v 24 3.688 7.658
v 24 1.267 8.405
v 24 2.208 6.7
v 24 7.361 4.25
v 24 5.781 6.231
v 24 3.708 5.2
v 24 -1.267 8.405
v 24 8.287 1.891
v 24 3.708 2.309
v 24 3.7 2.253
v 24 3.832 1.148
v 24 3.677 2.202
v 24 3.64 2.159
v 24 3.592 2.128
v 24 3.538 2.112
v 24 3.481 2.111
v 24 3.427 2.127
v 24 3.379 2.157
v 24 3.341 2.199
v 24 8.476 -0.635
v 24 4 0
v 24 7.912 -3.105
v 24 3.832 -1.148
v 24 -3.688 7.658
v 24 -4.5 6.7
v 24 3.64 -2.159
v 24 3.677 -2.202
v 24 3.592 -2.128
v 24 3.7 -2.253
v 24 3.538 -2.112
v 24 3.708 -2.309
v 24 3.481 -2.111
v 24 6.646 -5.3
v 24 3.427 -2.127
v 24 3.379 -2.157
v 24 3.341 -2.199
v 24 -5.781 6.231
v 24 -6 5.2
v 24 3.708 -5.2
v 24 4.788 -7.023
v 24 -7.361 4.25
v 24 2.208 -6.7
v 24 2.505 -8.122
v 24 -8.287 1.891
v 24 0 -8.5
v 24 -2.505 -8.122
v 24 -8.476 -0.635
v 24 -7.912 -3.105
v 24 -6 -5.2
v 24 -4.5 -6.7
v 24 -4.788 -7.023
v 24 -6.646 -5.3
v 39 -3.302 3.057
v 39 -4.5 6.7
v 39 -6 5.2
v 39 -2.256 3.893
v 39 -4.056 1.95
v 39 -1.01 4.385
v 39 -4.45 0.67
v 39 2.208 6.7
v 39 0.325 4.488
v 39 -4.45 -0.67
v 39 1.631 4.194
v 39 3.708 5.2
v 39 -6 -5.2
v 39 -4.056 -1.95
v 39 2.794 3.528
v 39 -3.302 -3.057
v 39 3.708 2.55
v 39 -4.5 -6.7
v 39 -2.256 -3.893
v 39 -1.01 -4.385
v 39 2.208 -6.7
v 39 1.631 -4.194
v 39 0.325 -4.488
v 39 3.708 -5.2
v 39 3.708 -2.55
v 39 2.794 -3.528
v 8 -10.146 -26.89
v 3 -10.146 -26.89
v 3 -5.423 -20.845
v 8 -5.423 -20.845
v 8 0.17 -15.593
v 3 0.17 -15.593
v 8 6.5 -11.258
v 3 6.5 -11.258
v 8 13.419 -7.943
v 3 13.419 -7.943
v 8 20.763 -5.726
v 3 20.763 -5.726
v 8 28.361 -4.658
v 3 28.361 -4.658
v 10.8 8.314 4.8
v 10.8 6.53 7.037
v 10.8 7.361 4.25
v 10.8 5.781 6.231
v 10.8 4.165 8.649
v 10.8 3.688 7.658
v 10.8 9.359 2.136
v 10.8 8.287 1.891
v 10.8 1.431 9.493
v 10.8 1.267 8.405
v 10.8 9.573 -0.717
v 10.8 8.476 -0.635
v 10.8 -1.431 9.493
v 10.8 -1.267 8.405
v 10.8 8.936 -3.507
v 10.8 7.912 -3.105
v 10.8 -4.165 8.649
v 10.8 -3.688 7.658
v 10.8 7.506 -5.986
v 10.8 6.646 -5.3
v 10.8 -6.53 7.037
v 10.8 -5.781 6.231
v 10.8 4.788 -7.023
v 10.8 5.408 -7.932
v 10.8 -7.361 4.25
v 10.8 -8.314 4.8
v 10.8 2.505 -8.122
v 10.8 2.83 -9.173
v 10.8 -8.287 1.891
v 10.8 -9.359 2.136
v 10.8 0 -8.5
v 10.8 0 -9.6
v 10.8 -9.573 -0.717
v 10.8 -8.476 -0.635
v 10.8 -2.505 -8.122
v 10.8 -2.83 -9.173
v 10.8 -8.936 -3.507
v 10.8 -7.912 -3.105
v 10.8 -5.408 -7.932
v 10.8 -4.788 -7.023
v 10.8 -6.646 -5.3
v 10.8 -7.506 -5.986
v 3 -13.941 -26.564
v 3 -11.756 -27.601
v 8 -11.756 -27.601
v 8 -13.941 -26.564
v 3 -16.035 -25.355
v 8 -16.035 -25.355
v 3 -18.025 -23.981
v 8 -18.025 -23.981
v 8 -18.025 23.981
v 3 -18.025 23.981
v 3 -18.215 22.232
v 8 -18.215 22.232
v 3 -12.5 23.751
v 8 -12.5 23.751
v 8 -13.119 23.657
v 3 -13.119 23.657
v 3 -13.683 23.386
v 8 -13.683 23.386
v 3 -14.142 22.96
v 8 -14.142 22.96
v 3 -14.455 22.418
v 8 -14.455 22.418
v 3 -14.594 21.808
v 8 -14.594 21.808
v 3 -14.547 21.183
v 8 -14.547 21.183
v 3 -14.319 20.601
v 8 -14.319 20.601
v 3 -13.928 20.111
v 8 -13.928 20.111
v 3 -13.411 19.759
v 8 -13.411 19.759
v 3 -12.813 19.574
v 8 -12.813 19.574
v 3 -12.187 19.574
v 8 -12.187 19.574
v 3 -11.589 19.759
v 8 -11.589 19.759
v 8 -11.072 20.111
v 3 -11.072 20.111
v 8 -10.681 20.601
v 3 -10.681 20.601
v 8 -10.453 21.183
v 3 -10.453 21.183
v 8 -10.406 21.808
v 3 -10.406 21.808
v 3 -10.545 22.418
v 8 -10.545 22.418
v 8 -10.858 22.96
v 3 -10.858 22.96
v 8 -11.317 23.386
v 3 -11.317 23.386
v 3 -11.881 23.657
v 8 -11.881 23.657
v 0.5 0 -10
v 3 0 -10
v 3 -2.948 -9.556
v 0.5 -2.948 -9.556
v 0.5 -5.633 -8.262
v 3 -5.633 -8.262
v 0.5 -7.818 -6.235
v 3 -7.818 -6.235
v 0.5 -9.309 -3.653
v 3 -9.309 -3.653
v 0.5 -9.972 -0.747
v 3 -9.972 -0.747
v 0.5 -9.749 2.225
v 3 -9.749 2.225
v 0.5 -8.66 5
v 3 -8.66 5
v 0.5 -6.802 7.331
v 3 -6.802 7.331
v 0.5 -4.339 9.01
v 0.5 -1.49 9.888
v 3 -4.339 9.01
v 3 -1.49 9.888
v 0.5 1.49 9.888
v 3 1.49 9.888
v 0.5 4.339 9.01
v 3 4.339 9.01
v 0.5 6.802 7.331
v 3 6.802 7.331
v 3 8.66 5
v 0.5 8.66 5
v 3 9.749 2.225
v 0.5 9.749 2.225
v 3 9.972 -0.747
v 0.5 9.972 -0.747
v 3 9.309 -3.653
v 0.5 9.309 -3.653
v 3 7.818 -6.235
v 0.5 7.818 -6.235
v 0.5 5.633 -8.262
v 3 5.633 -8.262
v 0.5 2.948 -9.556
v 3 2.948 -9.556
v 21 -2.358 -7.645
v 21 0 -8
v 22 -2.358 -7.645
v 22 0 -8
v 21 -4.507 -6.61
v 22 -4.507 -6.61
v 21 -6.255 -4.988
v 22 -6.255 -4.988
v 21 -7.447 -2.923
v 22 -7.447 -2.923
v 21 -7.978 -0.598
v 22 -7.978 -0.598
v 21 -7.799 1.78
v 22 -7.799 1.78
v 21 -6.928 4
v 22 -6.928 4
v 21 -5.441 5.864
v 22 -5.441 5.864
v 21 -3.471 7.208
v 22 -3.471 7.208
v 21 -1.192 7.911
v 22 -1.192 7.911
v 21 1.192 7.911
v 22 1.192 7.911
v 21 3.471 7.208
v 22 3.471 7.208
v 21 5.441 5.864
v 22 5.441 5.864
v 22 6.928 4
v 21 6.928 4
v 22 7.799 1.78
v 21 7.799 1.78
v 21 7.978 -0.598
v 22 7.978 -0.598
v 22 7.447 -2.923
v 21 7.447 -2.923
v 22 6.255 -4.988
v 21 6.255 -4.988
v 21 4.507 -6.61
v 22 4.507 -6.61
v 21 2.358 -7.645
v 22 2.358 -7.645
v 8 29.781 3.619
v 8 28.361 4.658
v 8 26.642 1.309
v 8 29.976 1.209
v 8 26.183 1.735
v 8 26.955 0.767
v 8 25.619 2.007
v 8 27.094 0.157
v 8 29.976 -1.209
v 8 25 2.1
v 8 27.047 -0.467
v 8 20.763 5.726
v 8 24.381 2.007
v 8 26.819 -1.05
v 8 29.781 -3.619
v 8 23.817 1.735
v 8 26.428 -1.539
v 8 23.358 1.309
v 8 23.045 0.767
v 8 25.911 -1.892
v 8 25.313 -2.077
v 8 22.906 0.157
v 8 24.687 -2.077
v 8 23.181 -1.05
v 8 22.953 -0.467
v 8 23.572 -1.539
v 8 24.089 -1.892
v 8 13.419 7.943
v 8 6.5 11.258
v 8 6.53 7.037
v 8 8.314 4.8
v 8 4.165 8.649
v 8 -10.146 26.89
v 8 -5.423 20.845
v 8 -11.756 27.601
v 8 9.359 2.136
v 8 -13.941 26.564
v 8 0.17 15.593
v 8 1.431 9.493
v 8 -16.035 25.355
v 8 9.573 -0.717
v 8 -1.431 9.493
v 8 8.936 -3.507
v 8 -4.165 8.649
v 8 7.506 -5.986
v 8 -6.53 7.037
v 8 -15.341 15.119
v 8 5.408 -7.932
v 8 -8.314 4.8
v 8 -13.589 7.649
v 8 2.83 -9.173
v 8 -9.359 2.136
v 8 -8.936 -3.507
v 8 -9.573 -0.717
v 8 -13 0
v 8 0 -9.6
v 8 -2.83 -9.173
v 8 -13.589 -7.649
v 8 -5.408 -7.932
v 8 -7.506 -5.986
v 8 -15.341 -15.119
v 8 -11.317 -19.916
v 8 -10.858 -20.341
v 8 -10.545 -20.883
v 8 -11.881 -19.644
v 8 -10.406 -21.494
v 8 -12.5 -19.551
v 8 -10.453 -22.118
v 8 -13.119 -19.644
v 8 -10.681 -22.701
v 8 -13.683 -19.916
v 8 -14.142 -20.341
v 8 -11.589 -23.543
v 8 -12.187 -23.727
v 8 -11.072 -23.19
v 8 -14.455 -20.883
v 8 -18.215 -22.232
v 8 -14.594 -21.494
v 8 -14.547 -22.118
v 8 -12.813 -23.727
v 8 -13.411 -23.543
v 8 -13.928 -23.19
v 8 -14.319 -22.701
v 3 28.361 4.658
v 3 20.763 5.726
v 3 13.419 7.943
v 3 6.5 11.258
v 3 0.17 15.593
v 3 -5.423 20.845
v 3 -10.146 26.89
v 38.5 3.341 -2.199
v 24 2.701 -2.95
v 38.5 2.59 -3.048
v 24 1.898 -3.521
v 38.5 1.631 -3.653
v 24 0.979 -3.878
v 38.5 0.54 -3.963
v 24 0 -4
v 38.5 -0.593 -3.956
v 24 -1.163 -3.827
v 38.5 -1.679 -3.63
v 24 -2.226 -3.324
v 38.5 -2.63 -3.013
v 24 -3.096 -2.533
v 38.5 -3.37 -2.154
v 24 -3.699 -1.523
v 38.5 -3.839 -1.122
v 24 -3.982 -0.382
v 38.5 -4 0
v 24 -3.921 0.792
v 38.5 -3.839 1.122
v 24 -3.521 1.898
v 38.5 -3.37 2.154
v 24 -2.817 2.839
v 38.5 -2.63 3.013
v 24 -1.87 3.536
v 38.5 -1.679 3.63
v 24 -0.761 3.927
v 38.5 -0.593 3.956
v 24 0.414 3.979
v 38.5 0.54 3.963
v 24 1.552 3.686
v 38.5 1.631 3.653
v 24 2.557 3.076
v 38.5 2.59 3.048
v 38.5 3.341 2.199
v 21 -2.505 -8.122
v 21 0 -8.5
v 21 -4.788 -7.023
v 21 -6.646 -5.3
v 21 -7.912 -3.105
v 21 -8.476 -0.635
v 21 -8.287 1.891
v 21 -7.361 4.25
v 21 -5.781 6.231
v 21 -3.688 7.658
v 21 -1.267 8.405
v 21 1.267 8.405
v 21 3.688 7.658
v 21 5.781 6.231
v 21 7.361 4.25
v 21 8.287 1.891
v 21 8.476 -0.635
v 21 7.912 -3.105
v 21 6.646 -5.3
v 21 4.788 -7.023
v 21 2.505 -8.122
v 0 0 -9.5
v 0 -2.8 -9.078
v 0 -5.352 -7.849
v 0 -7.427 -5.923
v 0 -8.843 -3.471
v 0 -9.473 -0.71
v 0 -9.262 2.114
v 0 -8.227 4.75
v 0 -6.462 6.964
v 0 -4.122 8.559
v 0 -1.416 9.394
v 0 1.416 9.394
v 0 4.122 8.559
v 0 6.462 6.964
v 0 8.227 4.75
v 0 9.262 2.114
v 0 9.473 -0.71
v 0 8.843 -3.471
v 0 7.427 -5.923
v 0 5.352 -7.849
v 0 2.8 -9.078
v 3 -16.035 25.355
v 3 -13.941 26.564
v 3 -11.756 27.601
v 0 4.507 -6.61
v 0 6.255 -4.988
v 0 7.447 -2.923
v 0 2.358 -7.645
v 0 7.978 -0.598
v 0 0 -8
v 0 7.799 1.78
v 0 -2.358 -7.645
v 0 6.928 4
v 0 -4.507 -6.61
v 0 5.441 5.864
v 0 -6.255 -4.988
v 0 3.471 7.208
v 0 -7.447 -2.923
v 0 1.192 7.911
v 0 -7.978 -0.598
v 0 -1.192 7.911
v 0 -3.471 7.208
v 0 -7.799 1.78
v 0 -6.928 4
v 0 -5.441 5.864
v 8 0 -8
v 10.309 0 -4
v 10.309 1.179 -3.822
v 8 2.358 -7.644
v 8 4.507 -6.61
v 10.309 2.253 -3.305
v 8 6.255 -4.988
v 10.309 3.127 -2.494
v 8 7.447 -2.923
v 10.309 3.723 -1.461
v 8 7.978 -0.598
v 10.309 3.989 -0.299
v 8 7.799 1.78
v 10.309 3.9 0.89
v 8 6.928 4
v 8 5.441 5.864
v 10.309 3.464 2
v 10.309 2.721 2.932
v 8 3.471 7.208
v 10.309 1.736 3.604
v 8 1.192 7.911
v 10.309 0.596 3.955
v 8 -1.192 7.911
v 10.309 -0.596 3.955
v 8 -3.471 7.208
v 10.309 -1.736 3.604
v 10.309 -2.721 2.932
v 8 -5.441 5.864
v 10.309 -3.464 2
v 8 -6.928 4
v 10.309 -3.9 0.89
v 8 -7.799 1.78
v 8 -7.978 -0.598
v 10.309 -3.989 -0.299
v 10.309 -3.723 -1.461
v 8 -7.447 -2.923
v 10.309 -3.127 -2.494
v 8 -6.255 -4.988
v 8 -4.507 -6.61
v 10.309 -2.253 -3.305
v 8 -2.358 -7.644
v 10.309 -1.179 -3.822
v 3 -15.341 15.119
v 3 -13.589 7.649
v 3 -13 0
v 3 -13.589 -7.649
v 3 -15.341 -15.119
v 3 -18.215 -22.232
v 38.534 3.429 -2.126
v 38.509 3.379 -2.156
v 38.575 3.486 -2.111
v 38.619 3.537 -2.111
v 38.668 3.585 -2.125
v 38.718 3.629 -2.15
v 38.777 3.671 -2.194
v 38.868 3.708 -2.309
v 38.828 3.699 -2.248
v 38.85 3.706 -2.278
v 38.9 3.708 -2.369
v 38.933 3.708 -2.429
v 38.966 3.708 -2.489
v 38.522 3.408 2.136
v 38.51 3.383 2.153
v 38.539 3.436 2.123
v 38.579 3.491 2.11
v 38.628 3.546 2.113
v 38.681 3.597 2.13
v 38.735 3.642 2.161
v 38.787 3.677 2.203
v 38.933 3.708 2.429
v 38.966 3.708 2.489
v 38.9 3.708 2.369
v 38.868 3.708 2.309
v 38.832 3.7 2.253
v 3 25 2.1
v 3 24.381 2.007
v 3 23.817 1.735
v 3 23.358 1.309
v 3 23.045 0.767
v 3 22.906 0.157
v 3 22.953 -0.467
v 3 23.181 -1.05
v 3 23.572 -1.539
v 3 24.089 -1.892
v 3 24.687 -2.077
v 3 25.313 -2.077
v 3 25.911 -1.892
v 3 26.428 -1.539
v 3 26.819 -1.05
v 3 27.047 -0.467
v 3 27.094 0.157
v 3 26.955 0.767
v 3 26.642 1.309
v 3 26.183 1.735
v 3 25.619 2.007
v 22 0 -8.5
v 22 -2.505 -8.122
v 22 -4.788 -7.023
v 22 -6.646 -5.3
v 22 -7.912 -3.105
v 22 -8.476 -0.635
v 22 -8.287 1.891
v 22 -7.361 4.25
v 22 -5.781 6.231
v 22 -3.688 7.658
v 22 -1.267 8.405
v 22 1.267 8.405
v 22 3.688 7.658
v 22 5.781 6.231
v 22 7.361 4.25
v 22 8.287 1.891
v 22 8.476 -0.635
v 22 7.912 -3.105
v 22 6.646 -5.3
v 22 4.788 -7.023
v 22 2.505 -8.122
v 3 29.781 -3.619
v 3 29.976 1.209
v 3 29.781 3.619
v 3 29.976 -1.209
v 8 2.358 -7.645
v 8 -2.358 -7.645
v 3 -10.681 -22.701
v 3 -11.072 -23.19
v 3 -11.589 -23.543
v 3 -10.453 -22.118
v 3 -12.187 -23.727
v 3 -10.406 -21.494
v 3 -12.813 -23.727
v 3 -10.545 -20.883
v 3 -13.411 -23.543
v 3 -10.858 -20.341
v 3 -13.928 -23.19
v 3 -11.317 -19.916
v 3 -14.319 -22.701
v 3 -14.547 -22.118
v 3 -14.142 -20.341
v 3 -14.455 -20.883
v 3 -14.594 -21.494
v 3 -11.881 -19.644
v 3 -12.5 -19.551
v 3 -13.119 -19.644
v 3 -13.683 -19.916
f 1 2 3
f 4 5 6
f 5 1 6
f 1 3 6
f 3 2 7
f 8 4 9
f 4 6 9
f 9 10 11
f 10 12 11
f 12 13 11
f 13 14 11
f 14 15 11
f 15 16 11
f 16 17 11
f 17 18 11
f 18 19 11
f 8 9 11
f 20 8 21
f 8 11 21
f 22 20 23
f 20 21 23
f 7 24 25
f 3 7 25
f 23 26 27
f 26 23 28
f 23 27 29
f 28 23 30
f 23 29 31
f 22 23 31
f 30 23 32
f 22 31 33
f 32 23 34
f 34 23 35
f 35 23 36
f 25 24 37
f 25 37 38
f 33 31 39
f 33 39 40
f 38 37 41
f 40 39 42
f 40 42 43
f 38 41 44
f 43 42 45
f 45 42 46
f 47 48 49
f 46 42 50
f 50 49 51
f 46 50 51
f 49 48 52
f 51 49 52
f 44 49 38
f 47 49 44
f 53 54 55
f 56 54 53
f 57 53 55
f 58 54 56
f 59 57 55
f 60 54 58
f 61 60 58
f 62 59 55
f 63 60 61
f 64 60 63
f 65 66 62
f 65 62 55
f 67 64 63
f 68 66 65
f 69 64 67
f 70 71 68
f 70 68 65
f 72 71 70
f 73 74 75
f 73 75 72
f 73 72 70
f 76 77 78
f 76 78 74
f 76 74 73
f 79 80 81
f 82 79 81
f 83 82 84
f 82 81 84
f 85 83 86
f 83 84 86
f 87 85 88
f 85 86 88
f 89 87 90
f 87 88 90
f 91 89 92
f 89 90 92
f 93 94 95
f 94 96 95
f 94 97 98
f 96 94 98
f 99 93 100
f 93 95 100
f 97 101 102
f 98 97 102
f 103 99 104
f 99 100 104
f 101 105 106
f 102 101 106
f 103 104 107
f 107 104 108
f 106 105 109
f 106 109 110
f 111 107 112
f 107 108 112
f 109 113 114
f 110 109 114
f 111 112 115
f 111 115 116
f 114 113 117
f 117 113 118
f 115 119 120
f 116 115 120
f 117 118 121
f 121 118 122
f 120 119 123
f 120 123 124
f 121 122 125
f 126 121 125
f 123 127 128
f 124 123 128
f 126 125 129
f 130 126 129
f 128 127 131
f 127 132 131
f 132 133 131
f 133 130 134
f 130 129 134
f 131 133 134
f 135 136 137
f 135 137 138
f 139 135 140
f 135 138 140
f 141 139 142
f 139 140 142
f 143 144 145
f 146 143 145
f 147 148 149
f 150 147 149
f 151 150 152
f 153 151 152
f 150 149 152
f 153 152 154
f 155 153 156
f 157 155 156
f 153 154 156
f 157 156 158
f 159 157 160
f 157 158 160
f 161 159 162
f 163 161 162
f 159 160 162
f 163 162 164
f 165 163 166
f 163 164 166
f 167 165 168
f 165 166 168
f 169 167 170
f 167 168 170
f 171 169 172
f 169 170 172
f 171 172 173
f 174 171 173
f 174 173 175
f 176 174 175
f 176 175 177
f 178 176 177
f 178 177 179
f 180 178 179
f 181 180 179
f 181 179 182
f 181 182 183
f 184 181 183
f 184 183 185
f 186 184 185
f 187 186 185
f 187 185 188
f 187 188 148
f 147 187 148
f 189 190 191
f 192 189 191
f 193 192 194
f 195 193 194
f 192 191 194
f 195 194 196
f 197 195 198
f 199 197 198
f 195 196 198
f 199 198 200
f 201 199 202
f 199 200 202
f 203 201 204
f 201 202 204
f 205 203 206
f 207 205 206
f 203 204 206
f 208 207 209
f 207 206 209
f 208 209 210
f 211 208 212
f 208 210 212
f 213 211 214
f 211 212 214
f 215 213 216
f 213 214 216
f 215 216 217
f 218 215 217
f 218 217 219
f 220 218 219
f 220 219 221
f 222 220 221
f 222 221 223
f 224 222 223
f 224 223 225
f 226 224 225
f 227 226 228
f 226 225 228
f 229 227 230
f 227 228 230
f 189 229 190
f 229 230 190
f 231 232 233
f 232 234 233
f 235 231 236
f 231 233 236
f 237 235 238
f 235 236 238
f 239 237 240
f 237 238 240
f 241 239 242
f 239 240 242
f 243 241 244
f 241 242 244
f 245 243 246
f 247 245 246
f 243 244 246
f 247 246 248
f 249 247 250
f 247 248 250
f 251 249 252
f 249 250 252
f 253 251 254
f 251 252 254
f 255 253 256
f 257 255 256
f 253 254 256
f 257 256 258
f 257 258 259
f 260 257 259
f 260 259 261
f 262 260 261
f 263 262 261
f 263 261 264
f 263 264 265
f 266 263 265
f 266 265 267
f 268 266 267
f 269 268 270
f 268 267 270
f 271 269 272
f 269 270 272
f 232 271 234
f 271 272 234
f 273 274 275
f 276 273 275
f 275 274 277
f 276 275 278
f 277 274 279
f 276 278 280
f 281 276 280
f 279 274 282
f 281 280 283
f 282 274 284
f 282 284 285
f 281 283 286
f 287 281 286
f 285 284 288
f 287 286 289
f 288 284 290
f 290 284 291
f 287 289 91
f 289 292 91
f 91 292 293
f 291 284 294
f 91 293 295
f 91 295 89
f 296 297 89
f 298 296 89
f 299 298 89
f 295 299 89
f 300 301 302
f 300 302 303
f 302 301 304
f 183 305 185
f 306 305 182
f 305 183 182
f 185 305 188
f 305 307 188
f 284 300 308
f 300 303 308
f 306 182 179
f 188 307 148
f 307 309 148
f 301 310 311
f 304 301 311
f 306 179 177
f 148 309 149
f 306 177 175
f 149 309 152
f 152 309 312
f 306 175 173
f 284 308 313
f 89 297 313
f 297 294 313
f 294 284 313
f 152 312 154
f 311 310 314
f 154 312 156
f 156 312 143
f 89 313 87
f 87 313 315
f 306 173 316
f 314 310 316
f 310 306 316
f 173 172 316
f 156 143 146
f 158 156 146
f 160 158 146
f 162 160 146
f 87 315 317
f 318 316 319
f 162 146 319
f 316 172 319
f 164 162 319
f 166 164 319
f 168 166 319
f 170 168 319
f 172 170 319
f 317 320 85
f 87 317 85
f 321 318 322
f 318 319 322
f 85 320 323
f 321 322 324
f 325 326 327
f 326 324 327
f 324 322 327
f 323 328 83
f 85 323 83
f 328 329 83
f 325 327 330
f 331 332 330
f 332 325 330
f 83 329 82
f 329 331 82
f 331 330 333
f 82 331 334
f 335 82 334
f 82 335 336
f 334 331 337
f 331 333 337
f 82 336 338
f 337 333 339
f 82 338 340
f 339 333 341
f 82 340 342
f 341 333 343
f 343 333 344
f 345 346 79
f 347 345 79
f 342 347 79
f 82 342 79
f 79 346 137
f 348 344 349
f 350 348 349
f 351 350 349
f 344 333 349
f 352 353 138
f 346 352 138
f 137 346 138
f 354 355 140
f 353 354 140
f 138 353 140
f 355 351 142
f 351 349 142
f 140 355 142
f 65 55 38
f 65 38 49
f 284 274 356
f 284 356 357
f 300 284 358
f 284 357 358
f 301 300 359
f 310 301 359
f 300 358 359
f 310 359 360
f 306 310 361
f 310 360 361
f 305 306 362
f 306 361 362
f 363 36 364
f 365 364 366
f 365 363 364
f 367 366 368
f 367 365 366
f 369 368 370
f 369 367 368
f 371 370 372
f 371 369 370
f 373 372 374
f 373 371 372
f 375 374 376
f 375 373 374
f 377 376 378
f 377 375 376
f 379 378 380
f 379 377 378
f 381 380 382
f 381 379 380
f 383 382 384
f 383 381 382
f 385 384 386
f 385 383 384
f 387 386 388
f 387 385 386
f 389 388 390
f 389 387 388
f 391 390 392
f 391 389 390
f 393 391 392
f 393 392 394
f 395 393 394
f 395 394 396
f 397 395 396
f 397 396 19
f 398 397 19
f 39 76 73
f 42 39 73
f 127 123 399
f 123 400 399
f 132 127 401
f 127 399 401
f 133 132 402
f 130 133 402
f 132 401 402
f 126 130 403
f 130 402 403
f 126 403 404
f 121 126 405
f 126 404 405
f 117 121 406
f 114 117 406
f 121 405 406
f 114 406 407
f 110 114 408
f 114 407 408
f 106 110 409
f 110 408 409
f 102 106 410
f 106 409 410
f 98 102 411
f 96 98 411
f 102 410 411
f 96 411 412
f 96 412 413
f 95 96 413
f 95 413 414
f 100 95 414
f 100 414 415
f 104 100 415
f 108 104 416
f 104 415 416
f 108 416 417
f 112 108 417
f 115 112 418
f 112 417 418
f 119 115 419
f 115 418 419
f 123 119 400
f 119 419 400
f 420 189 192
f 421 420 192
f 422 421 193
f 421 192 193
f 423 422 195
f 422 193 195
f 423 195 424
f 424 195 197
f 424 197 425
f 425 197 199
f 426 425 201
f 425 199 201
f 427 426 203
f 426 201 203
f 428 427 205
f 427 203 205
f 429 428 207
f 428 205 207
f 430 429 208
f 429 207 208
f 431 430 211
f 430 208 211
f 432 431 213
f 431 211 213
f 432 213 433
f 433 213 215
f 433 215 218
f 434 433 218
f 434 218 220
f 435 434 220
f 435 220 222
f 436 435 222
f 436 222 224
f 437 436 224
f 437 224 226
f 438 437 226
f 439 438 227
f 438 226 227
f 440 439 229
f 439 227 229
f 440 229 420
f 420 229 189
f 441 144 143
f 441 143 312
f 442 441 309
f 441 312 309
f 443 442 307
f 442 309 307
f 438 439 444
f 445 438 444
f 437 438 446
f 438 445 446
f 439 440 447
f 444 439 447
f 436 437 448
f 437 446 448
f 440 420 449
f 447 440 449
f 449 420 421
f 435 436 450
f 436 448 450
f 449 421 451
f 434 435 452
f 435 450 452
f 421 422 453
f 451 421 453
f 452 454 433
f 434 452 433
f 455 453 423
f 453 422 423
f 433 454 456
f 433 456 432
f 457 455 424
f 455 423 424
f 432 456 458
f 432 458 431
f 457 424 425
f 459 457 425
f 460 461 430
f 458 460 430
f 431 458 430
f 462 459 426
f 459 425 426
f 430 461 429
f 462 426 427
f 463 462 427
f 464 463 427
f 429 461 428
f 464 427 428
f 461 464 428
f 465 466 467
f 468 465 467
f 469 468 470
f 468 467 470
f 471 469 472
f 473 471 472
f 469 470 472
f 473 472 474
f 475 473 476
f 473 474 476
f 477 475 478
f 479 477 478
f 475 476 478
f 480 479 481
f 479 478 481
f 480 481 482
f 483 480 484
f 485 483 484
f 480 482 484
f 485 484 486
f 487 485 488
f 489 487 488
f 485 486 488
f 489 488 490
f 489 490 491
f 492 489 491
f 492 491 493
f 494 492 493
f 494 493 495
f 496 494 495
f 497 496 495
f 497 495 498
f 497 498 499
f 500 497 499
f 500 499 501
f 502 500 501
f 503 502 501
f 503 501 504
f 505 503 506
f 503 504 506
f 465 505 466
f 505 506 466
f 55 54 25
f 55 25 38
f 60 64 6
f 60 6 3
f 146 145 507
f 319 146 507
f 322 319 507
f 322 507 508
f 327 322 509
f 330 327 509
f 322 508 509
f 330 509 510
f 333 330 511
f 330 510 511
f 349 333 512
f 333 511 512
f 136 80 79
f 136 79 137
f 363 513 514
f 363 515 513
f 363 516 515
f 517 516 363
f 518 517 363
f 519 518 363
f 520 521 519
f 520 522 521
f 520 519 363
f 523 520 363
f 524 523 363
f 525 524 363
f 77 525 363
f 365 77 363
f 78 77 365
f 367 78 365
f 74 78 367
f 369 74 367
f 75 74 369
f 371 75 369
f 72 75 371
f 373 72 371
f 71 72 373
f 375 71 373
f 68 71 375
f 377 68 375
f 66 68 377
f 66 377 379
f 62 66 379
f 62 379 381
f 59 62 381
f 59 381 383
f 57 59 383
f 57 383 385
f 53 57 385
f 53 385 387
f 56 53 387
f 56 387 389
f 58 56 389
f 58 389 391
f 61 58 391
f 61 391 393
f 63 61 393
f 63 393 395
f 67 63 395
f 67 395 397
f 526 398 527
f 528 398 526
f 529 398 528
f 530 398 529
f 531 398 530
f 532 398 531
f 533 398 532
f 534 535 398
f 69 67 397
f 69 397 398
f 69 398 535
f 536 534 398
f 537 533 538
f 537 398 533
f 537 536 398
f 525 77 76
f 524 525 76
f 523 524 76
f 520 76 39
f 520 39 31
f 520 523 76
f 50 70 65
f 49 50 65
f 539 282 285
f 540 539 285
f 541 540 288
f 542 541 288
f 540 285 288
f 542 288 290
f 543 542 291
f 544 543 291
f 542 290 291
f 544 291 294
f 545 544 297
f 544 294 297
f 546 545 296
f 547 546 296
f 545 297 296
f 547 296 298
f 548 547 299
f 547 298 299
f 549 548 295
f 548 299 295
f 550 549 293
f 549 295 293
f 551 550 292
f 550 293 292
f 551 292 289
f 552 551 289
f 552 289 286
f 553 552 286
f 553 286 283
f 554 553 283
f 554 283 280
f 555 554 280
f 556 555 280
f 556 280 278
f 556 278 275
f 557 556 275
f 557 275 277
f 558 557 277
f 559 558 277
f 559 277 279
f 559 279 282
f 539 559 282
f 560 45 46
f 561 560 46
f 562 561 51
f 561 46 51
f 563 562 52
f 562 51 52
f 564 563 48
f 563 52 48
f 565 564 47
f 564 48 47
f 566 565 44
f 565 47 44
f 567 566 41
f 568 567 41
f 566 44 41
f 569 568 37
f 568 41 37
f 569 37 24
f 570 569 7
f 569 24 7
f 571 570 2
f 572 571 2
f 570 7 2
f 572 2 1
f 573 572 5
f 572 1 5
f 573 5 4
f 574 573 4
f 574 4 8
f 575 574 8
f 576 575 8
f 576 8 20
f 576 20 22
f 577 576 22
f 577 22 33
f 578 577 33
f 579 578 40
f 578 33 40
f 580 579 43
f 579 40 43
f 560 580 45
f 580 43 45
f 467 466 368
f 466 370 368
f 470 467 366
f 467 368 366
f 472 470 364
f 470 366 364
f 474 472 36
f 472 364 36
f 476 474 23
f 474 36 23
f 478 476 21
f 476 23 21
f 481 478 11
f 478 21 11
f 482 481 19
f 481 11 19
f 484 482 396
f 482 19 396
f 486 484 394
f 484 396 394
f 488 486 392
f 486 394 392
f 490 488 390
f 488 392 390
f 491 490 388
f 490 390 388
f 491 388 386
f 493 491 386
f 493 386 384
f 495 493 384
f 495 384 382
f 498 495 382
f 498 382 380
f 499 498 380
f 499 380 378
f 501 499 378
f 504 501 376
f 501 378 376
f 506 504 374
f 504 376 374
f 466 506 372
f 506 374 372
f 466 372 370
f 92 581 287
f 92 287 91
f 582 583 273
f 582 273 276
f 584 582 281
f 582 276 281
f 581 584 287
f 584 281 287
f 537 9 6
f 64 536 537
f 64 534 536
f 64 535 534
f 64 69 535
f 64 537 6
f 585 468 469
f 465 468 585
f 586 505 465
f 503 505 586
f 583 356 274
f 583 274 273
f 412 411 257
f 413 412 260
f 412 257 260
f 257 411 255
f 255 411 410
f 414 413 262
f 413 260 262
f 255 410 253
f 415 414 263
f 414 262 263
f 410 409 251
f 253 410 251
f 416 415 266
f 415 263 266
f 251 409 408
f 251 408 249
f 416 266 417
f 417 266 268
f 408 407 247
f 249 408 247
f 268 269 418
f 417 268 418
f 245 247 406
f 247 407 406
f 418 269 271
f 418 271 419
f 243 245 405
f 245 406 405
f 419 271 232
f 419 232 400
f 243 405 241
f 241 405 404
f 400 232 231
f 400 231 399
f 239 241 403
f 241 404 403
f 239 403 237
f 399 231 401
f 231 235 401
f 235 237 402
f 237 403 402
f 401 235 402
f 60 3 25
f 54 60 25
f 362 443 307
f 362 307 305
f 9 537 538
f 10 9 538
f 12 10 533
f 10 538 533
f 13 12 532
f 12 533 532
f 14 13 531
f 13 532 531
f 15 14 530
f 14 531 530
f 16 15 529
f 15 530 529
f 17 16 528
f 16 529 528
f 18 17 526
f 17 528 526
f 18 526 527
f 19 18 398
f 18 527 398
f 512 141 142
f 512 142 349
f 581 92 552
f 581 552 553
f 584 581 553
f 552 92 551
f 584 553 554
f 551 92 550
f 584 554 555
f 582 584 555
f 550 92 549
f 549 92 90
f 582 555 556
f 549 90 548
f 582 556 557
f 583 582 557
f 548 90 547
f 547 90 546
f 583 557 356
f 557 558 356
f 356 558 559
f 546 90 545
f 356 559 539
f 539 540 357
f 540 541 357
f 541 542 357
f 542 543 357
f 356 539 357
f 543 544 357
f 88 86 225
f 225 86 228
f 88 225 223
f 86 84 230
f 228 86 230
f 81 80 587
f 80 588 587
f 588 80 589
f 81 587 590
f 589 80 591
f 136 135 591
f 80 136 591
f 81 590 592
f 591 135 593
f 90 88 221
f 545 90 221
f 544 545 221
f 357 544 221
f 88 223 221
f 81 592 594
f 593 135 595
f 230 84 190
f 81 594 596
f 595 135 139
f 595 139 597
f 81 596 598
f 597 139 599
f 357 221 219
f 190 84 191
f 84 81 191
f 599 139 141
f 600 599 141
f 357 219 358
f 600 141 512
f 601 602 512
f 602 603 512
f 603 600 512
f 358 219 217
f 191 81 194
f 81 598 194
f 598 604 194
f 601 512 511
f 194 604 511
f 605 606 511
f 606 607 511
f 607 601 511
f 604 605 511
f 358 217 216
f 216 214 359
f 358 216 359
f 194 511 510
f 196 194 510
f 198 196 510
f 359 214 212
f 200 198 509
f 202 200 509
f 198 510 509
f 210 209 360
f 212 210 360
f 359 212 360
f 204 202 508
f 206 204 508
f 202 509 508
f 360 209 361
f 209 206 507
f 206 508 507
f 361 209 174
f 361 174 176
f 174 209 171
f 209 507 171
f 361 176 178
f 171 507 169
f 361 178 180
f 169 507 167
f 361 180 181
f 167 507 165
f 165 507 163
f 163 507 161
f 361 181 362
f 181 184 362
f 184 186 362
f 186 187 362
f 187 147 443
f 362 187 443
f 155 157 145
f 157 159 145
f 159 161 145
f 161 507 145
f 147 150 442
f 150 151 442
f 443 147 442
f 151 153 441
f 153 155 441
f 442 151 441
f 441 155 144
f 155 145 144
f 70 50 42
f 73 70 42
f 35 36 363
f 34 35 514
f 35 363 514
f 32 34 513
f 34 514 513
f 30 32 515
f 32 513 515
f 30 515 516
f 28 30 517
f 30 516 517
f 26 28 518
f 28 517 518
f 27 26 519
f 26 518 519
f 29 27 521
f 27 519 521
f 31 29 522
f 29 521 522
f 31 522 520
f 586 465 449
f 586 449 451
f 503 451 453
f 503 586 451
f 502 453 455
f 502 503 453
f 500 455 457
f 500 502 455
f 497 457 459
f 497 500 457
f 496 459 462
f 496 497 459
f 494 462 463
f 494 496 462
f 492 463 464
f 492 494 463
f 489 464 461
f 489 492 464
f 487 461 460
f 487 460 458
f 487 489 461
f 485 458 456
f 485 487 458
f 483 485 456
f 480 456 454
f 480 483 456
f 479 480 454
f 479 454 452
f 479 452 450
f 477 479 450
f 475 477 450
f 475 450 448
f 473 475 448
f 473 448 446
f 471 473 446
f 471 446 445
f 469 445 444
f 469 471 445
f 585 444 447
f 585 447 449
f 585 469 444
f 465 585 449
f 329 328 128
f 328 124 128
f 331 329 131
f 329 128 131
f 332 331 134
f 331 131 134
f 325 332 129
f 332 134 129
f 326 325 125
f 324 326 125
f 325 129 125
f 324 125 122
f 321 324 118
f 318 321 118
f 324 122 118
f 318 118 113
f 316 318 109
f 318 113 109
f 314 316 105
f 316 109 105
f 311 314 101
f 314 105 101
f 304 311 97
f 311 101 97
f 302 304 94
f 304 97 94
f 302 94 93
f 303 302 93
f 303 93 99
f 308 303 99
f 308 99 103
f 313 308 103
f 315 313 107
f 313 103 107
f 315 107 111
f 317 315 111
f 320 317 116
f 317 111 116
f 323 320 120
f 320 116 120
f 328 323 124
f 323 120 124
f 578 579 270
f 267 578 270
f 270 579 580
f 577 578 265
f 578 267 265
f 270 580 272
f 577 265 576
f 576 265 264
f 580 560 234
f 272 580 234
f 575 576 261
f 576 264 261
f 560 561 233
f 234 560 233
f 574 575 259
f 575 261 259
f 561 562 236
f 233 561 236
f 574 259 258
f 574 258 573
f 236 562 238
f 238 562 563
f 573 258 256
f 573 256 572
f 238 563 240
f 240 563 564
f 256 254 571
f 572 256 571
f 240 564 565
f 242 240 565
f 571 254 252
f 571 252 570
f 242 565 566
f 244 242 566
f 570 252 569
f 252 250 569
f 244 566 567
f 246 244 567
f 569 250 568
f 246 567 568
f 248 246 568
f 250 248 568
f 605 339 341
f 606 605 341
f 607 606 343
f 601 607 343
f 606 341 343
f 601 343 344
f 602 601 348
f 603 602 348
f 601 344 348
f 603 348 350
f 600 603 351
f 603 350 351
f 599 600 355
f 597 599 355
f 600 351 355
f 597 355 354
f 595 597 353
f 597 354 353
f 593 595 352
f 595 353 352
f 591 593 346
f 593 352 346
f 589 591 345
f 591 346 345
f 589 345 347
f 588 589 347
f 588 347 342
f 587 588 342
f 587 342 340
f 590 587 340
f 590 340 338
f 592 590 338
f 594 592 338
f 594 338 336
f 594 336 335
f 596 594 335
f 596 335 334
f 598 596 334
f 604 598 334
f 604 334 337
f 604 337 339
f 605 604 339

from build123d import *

# Parameters (mm, degrees)
SKETCH_2_R               = 4
CUT_EXTRUDE_1_DEPTH      = 49.744230428
CUT_EXTRUDE_START        = -8
SKETCH_3_R               = 8
CUT_EXTRUDE_2_DEPTH      = 8
CHAMFER_1_SIZE2          = 2.309401077
CHAMFER_1_SIZE           = 4
HOLE_WIZARD_M5_1_D       = 4.2
CUT_EXTRUDE_3_DEPTH      = 48.339201514
PATTERN_CIRCULAR_1_COUNT = 3
CHAMFER_4_SIZE           = 0.5
EXTRUDE_START            = 15
EXTRUDE_1_DEPTH          = 15
CHAMFER_5_SIZE           = 1.5
CHAMFER_6_SIZE           = 0.5
FILLET_1_R               = 0.2


# Some blends are built 0.0001 mm under size
with BuildPart() as part:
    # 草图1 → 旋转1 (revolve)
    with BuildSketch(Plane.XY, mode=Mode.PRIVATE) as revolve_1_sk:
        Polygon((0, 0), (0, 10), (3, 10), (3, 30), (8, 30), (8, 9.6), (10.8, 9.6), (10.8, 8.5), (21, 8.5), (21, 8), (22, 8), (22, 8.5), (24, 8.5), (24, 0), align=None)
    revolve(revolve_1_sk.sketch.rotate(Axis((24, 0, 0), (-1, 0, 0)), 90), axis=Axis((24, 0, 0), (-1, 0, 0)))

    # 草图2 → 切除-拉伸1 (cut, through all)
    with BuildSketch(Plane(origin=(24, 0, 0), x_dir=(0, 0, -1), z_dir=(1, 0, 0))):
        Circle(SKETCH_2_R)
    extrude(amount=-CUT_EXTRUDE_1_DEPTH, mode=Mode.SUBTRACT)

    # 草图3 → 切除-拉伸2 (cut)
    with BuildSketch(Plane.ZY.offset(CUT_EXTRUDE_START)):
        with Locations(Location((0, 0, 0), (0, 0, 180))):
            Circle(SKETCH_3_R)
    extrude(amount=CUT_EXTRUDE_2_DEPTH, mode=Mode.SUBTRACT)

    # 倒角1
    chamfer_1_edges = [part.edges().sort_by_distance(p)[0] for p in [
        (8, 0, 4),
    ]]
    chamfer_1_side = [part.faces().sort_by_distance(p)[0] for p in [
        (8, 0, 4.046188022),
    ]]
    chamfer(chamfer_1_edges, length=CHAMFER_1_SIZE - 0.0001, length2=CHAMFER_1_SIZE2 - 0.0001, reference=chamfer_1_side[0])  # a hair under: the kernel refuses the full size

    # M5 螺纹孔1 (through all)
    with Locations(Plane(origin=(3, 25, 0), x_dir=(0, 0, -1), z_dir=(-1, 0, 0))):
        with Locations((0, 0), (-21.650635095, 37.5), (21.650635095, 37.5)):
            Hole(HOLE_WIZARD_M5_1_D / 2)

    # 草图4 → 切除-拉伸3 (cut, through all)
    with BuildSketch(Plane.ZY.offset(-3)):
        with BuildLine():
            ThreePointArc((-27.710194429, -21.380952381), (0, -35), (27.710194429, -21.380952381))
            ThreePointArc((27.710194429, -21.380952381), (0, -13), (-27.710194429, -21.380952381))
        make_face()
    cut_extrude_3 = extrude(amount=-CUT_EXTRUDE_3_DEPTH, mode=Mode.SUBTRACT)

    # 阵列(圆周)1: 切除-拉伸3 ×3 about axis
    pattern_circular_1_axis = Axis((0, 0, 0), (1, 0, 0))
    for i in range(1, PATTERN_CIRCULAR_1_COUNT):
        add(cut_extrude_3.rotate(pattern_circular_1_axis, i * 360 / PATTERN_CIRCULAR_1_COUNT), mode=Mode.SUBTRACT)

    # 倒角2
    # the kernel refuses this chamfer: 1.262336382, 1 mm, written as the material it takes off along each edge
    with BuildSketch(Plane(origin=(-0.323534522, -18.801587302, -23.377346191), x_dir=(0, 0.7894182220381707, -0.6138557409637001), z_dir=(1, 0, 0)), Plane(origin=(-0.323534522, -10.844582024, 27.97132533), x_dir=(0, -0.9263237769525716, -0.3767283640135453), z_dir=(1, 0, 0)), Plane(origin=(-0.323534522, 29.646169325, -4.593979139), x_dir=(0, 0.13690555491440626, 0.9905841049772496), z_dir=(1, 0, 0))) as chamfer_2_piece_1:
        with BuildLine():
            Line((0.983994902, 0), (-0.239625676, 1.264429883))
            ThreePointArc((-0.239625676, 1.264429883), (-0.119678092, 0.653717986), (0, 0))
            ThreePointArc((0, 0), (0.509546154, -0.004029497), (0.983994902, 0))
        make_face()
    extrude(amount=11.647069044, mode=Mode.SUBTRACT)
    with BuildSketch(Plane(origin=(-0.323534522, -10.844582024, -27.97132533), x_dir=(0, 0.5426204152715339, 0.8399780264569711), z_dir=(1, 0, 0)), Plane(origin=(-0.323534522, 29.646169325, 4.593979139), x_dir=(0, -0.9987525171682211, 0.04993405100872917), z_dir=(1, 0, 0))) as chamfer_2_piece_2:
        with BuildLine():
            Line((1.28693566, 0), (-0.183218517, 0.966786917))
            ThreePointArc((-0.183218517, 0.966786917), (-0.098835833, 0.499884984), (0, 0))
            ThreePointArc((0, 0), (0.664569743, 0.004136227), (1.28693566, 0))
        make_face()
    extrude(amount=11.647069044, mode=Mode.SUBTRACT)
    with BuildSketch(Plane(origin=(-0.323534522, -18.801587302, 23.377346191), x_dir=(0, 0.7894182220381672, 0.6138557409637047), z_dir=(1, 0, 0))) as chamfer_2_piece_3:
        with BuildLine():
            Line((0.983994902, 0), (-0.239625676, -1.264429883))
            ThreePointArc((-0.239625676, -1.264429883), (-0.119678092, -0.653717986), (0, 0))
            ThreePointArc((0, 0), (0.509546154, 0.004029497), (0.983994902, 0))
        make_face()
    extrude(amount=11.647069044, mode=Mode.SUBTRACT)

    # 倒角4
    chamfer_4_edges = [part.edges().sort_by_distance(p)[0] for p in [
        (0, 0, 10),
    ]]
    chamfer(chamfer_4_edges, length=CHAMFER_4_SIZE)

    # 草图7 → 凸台-拉伸1 (add)
    with BuildSketch(Plane(origin=(24, 0, 0), x_dir=(0, 0, -1), z_dir=(1, 0, 0)).offset(EXTRUDE_START)):
        with BuildLine():
            Line((-6.7, -6), (6.7, -6))
            Line((6.7, -6), (6.7, 3.708099244))
            Line((6.7, 3.708099244), (1.5, 3.708099244))
            ThreePointArc((1.5, 3.708099244), (0, -4), (-1.5, 3.708099244))
            Line((-1.5, 3.708099244), (-6.7, 3.708099244))
            Line((-6.7, 3.708099244), (-6.7, -6))
        make_face()
    extrude(amount=-EXTRUDE_1_DEPTH)

    # 倒角5
    # the kernel refuses this chamfer: 1.5 mm, written as the material it takes off along each edge
    with BuildSketch(Plane(origin=(42.857524482, 3.708099244, 6.7), x_dir=(0, 0, -1), z_dir=(-1, 0, 0)), Plane(origin=(42.857524482, -6, 6.7), x_dir=(0, 1, 0), z_dir=(-1, 0, 0))) as chamfer_5_piece_1:
        Polygon((CHAMFER_5_SIZE, 0), (0, CHAMFER_5_SIZE), (0, 0), align=None)
    extrude(amount=18.857524482, mode=Mode.SUBTRACT)
    with BuildSketch(Plane(origin=(42.857524482, -6, -6.7), x_dir=(0, 1, 0), z_dir=(-1, 0, 0)), Plane(origin=(42.857524482, 3.708099244, -6.7), x_dir=(0, 0, 1), z_dir=(-1, 0, 0))) as chamfer_5_piece_2:
        Polygon((CHAMFER_5_SIZE, 0), (0, -CHAMFER_5_SIZE), (0, 0), align=None)
    extrude(amount=18.857524482, mode=Mode.SUBTRACT)

    # 倒角6
    chamfer_6_edges = [part.edges().sort_by_distance(p)[0] for p in [
        (39, -4, 0),
    ]]
    chamfer(chamfer_6_edges, length=CHAMFER_6_SIZE)

    # 圆角1
    # the kernel refuses this fillet: 0.2 mm, written as the material it takes off along each edge
    with BuildSketch(Plane(origin=(40.52345201, 3.708099244, 1.5), x_dir=(0, -0.464696875551773, 0.8854698266188521), z_dir=(-1, 0, 0))) as fillet_1_piece_1:
        with BuildLine():
            CenterArc((0.809621655, 0.199022765), FILLET_1_R, 117.690606121, 146.643100594)
            Line((0.71668228, 0.376116731), (0, 0))
            ThreePointArc((0, 0), (0.394937393, 0.019544692), (0.789874786, 0))
        make_face()
    extrude(amount=16.52345201, mode=Mode.SUBTRACT)
    with BuildSketch(Plane(origin=(40.52345201, 3.708099244, -1.5), x_dir=(0, -0.46469687555177314, -0.885469826618852), z_dir=(-1, 0, 0))) as fillet_1_piece_2:
        with BuildLine():
            CenterArc((0.809621655, -0.199022765), FILLET_1_R, 95.666293284, 146.643100594)
            Line((0.71668228, -0.376116731), (0, 0))
            ThreePointArc((0, 0), (0.394937393, -0.019544692), (0.789874786, 0))
        make_face()
    extrude(amount=16.52345201, mode=Mode.SUBTRACT)


solid = part.part
